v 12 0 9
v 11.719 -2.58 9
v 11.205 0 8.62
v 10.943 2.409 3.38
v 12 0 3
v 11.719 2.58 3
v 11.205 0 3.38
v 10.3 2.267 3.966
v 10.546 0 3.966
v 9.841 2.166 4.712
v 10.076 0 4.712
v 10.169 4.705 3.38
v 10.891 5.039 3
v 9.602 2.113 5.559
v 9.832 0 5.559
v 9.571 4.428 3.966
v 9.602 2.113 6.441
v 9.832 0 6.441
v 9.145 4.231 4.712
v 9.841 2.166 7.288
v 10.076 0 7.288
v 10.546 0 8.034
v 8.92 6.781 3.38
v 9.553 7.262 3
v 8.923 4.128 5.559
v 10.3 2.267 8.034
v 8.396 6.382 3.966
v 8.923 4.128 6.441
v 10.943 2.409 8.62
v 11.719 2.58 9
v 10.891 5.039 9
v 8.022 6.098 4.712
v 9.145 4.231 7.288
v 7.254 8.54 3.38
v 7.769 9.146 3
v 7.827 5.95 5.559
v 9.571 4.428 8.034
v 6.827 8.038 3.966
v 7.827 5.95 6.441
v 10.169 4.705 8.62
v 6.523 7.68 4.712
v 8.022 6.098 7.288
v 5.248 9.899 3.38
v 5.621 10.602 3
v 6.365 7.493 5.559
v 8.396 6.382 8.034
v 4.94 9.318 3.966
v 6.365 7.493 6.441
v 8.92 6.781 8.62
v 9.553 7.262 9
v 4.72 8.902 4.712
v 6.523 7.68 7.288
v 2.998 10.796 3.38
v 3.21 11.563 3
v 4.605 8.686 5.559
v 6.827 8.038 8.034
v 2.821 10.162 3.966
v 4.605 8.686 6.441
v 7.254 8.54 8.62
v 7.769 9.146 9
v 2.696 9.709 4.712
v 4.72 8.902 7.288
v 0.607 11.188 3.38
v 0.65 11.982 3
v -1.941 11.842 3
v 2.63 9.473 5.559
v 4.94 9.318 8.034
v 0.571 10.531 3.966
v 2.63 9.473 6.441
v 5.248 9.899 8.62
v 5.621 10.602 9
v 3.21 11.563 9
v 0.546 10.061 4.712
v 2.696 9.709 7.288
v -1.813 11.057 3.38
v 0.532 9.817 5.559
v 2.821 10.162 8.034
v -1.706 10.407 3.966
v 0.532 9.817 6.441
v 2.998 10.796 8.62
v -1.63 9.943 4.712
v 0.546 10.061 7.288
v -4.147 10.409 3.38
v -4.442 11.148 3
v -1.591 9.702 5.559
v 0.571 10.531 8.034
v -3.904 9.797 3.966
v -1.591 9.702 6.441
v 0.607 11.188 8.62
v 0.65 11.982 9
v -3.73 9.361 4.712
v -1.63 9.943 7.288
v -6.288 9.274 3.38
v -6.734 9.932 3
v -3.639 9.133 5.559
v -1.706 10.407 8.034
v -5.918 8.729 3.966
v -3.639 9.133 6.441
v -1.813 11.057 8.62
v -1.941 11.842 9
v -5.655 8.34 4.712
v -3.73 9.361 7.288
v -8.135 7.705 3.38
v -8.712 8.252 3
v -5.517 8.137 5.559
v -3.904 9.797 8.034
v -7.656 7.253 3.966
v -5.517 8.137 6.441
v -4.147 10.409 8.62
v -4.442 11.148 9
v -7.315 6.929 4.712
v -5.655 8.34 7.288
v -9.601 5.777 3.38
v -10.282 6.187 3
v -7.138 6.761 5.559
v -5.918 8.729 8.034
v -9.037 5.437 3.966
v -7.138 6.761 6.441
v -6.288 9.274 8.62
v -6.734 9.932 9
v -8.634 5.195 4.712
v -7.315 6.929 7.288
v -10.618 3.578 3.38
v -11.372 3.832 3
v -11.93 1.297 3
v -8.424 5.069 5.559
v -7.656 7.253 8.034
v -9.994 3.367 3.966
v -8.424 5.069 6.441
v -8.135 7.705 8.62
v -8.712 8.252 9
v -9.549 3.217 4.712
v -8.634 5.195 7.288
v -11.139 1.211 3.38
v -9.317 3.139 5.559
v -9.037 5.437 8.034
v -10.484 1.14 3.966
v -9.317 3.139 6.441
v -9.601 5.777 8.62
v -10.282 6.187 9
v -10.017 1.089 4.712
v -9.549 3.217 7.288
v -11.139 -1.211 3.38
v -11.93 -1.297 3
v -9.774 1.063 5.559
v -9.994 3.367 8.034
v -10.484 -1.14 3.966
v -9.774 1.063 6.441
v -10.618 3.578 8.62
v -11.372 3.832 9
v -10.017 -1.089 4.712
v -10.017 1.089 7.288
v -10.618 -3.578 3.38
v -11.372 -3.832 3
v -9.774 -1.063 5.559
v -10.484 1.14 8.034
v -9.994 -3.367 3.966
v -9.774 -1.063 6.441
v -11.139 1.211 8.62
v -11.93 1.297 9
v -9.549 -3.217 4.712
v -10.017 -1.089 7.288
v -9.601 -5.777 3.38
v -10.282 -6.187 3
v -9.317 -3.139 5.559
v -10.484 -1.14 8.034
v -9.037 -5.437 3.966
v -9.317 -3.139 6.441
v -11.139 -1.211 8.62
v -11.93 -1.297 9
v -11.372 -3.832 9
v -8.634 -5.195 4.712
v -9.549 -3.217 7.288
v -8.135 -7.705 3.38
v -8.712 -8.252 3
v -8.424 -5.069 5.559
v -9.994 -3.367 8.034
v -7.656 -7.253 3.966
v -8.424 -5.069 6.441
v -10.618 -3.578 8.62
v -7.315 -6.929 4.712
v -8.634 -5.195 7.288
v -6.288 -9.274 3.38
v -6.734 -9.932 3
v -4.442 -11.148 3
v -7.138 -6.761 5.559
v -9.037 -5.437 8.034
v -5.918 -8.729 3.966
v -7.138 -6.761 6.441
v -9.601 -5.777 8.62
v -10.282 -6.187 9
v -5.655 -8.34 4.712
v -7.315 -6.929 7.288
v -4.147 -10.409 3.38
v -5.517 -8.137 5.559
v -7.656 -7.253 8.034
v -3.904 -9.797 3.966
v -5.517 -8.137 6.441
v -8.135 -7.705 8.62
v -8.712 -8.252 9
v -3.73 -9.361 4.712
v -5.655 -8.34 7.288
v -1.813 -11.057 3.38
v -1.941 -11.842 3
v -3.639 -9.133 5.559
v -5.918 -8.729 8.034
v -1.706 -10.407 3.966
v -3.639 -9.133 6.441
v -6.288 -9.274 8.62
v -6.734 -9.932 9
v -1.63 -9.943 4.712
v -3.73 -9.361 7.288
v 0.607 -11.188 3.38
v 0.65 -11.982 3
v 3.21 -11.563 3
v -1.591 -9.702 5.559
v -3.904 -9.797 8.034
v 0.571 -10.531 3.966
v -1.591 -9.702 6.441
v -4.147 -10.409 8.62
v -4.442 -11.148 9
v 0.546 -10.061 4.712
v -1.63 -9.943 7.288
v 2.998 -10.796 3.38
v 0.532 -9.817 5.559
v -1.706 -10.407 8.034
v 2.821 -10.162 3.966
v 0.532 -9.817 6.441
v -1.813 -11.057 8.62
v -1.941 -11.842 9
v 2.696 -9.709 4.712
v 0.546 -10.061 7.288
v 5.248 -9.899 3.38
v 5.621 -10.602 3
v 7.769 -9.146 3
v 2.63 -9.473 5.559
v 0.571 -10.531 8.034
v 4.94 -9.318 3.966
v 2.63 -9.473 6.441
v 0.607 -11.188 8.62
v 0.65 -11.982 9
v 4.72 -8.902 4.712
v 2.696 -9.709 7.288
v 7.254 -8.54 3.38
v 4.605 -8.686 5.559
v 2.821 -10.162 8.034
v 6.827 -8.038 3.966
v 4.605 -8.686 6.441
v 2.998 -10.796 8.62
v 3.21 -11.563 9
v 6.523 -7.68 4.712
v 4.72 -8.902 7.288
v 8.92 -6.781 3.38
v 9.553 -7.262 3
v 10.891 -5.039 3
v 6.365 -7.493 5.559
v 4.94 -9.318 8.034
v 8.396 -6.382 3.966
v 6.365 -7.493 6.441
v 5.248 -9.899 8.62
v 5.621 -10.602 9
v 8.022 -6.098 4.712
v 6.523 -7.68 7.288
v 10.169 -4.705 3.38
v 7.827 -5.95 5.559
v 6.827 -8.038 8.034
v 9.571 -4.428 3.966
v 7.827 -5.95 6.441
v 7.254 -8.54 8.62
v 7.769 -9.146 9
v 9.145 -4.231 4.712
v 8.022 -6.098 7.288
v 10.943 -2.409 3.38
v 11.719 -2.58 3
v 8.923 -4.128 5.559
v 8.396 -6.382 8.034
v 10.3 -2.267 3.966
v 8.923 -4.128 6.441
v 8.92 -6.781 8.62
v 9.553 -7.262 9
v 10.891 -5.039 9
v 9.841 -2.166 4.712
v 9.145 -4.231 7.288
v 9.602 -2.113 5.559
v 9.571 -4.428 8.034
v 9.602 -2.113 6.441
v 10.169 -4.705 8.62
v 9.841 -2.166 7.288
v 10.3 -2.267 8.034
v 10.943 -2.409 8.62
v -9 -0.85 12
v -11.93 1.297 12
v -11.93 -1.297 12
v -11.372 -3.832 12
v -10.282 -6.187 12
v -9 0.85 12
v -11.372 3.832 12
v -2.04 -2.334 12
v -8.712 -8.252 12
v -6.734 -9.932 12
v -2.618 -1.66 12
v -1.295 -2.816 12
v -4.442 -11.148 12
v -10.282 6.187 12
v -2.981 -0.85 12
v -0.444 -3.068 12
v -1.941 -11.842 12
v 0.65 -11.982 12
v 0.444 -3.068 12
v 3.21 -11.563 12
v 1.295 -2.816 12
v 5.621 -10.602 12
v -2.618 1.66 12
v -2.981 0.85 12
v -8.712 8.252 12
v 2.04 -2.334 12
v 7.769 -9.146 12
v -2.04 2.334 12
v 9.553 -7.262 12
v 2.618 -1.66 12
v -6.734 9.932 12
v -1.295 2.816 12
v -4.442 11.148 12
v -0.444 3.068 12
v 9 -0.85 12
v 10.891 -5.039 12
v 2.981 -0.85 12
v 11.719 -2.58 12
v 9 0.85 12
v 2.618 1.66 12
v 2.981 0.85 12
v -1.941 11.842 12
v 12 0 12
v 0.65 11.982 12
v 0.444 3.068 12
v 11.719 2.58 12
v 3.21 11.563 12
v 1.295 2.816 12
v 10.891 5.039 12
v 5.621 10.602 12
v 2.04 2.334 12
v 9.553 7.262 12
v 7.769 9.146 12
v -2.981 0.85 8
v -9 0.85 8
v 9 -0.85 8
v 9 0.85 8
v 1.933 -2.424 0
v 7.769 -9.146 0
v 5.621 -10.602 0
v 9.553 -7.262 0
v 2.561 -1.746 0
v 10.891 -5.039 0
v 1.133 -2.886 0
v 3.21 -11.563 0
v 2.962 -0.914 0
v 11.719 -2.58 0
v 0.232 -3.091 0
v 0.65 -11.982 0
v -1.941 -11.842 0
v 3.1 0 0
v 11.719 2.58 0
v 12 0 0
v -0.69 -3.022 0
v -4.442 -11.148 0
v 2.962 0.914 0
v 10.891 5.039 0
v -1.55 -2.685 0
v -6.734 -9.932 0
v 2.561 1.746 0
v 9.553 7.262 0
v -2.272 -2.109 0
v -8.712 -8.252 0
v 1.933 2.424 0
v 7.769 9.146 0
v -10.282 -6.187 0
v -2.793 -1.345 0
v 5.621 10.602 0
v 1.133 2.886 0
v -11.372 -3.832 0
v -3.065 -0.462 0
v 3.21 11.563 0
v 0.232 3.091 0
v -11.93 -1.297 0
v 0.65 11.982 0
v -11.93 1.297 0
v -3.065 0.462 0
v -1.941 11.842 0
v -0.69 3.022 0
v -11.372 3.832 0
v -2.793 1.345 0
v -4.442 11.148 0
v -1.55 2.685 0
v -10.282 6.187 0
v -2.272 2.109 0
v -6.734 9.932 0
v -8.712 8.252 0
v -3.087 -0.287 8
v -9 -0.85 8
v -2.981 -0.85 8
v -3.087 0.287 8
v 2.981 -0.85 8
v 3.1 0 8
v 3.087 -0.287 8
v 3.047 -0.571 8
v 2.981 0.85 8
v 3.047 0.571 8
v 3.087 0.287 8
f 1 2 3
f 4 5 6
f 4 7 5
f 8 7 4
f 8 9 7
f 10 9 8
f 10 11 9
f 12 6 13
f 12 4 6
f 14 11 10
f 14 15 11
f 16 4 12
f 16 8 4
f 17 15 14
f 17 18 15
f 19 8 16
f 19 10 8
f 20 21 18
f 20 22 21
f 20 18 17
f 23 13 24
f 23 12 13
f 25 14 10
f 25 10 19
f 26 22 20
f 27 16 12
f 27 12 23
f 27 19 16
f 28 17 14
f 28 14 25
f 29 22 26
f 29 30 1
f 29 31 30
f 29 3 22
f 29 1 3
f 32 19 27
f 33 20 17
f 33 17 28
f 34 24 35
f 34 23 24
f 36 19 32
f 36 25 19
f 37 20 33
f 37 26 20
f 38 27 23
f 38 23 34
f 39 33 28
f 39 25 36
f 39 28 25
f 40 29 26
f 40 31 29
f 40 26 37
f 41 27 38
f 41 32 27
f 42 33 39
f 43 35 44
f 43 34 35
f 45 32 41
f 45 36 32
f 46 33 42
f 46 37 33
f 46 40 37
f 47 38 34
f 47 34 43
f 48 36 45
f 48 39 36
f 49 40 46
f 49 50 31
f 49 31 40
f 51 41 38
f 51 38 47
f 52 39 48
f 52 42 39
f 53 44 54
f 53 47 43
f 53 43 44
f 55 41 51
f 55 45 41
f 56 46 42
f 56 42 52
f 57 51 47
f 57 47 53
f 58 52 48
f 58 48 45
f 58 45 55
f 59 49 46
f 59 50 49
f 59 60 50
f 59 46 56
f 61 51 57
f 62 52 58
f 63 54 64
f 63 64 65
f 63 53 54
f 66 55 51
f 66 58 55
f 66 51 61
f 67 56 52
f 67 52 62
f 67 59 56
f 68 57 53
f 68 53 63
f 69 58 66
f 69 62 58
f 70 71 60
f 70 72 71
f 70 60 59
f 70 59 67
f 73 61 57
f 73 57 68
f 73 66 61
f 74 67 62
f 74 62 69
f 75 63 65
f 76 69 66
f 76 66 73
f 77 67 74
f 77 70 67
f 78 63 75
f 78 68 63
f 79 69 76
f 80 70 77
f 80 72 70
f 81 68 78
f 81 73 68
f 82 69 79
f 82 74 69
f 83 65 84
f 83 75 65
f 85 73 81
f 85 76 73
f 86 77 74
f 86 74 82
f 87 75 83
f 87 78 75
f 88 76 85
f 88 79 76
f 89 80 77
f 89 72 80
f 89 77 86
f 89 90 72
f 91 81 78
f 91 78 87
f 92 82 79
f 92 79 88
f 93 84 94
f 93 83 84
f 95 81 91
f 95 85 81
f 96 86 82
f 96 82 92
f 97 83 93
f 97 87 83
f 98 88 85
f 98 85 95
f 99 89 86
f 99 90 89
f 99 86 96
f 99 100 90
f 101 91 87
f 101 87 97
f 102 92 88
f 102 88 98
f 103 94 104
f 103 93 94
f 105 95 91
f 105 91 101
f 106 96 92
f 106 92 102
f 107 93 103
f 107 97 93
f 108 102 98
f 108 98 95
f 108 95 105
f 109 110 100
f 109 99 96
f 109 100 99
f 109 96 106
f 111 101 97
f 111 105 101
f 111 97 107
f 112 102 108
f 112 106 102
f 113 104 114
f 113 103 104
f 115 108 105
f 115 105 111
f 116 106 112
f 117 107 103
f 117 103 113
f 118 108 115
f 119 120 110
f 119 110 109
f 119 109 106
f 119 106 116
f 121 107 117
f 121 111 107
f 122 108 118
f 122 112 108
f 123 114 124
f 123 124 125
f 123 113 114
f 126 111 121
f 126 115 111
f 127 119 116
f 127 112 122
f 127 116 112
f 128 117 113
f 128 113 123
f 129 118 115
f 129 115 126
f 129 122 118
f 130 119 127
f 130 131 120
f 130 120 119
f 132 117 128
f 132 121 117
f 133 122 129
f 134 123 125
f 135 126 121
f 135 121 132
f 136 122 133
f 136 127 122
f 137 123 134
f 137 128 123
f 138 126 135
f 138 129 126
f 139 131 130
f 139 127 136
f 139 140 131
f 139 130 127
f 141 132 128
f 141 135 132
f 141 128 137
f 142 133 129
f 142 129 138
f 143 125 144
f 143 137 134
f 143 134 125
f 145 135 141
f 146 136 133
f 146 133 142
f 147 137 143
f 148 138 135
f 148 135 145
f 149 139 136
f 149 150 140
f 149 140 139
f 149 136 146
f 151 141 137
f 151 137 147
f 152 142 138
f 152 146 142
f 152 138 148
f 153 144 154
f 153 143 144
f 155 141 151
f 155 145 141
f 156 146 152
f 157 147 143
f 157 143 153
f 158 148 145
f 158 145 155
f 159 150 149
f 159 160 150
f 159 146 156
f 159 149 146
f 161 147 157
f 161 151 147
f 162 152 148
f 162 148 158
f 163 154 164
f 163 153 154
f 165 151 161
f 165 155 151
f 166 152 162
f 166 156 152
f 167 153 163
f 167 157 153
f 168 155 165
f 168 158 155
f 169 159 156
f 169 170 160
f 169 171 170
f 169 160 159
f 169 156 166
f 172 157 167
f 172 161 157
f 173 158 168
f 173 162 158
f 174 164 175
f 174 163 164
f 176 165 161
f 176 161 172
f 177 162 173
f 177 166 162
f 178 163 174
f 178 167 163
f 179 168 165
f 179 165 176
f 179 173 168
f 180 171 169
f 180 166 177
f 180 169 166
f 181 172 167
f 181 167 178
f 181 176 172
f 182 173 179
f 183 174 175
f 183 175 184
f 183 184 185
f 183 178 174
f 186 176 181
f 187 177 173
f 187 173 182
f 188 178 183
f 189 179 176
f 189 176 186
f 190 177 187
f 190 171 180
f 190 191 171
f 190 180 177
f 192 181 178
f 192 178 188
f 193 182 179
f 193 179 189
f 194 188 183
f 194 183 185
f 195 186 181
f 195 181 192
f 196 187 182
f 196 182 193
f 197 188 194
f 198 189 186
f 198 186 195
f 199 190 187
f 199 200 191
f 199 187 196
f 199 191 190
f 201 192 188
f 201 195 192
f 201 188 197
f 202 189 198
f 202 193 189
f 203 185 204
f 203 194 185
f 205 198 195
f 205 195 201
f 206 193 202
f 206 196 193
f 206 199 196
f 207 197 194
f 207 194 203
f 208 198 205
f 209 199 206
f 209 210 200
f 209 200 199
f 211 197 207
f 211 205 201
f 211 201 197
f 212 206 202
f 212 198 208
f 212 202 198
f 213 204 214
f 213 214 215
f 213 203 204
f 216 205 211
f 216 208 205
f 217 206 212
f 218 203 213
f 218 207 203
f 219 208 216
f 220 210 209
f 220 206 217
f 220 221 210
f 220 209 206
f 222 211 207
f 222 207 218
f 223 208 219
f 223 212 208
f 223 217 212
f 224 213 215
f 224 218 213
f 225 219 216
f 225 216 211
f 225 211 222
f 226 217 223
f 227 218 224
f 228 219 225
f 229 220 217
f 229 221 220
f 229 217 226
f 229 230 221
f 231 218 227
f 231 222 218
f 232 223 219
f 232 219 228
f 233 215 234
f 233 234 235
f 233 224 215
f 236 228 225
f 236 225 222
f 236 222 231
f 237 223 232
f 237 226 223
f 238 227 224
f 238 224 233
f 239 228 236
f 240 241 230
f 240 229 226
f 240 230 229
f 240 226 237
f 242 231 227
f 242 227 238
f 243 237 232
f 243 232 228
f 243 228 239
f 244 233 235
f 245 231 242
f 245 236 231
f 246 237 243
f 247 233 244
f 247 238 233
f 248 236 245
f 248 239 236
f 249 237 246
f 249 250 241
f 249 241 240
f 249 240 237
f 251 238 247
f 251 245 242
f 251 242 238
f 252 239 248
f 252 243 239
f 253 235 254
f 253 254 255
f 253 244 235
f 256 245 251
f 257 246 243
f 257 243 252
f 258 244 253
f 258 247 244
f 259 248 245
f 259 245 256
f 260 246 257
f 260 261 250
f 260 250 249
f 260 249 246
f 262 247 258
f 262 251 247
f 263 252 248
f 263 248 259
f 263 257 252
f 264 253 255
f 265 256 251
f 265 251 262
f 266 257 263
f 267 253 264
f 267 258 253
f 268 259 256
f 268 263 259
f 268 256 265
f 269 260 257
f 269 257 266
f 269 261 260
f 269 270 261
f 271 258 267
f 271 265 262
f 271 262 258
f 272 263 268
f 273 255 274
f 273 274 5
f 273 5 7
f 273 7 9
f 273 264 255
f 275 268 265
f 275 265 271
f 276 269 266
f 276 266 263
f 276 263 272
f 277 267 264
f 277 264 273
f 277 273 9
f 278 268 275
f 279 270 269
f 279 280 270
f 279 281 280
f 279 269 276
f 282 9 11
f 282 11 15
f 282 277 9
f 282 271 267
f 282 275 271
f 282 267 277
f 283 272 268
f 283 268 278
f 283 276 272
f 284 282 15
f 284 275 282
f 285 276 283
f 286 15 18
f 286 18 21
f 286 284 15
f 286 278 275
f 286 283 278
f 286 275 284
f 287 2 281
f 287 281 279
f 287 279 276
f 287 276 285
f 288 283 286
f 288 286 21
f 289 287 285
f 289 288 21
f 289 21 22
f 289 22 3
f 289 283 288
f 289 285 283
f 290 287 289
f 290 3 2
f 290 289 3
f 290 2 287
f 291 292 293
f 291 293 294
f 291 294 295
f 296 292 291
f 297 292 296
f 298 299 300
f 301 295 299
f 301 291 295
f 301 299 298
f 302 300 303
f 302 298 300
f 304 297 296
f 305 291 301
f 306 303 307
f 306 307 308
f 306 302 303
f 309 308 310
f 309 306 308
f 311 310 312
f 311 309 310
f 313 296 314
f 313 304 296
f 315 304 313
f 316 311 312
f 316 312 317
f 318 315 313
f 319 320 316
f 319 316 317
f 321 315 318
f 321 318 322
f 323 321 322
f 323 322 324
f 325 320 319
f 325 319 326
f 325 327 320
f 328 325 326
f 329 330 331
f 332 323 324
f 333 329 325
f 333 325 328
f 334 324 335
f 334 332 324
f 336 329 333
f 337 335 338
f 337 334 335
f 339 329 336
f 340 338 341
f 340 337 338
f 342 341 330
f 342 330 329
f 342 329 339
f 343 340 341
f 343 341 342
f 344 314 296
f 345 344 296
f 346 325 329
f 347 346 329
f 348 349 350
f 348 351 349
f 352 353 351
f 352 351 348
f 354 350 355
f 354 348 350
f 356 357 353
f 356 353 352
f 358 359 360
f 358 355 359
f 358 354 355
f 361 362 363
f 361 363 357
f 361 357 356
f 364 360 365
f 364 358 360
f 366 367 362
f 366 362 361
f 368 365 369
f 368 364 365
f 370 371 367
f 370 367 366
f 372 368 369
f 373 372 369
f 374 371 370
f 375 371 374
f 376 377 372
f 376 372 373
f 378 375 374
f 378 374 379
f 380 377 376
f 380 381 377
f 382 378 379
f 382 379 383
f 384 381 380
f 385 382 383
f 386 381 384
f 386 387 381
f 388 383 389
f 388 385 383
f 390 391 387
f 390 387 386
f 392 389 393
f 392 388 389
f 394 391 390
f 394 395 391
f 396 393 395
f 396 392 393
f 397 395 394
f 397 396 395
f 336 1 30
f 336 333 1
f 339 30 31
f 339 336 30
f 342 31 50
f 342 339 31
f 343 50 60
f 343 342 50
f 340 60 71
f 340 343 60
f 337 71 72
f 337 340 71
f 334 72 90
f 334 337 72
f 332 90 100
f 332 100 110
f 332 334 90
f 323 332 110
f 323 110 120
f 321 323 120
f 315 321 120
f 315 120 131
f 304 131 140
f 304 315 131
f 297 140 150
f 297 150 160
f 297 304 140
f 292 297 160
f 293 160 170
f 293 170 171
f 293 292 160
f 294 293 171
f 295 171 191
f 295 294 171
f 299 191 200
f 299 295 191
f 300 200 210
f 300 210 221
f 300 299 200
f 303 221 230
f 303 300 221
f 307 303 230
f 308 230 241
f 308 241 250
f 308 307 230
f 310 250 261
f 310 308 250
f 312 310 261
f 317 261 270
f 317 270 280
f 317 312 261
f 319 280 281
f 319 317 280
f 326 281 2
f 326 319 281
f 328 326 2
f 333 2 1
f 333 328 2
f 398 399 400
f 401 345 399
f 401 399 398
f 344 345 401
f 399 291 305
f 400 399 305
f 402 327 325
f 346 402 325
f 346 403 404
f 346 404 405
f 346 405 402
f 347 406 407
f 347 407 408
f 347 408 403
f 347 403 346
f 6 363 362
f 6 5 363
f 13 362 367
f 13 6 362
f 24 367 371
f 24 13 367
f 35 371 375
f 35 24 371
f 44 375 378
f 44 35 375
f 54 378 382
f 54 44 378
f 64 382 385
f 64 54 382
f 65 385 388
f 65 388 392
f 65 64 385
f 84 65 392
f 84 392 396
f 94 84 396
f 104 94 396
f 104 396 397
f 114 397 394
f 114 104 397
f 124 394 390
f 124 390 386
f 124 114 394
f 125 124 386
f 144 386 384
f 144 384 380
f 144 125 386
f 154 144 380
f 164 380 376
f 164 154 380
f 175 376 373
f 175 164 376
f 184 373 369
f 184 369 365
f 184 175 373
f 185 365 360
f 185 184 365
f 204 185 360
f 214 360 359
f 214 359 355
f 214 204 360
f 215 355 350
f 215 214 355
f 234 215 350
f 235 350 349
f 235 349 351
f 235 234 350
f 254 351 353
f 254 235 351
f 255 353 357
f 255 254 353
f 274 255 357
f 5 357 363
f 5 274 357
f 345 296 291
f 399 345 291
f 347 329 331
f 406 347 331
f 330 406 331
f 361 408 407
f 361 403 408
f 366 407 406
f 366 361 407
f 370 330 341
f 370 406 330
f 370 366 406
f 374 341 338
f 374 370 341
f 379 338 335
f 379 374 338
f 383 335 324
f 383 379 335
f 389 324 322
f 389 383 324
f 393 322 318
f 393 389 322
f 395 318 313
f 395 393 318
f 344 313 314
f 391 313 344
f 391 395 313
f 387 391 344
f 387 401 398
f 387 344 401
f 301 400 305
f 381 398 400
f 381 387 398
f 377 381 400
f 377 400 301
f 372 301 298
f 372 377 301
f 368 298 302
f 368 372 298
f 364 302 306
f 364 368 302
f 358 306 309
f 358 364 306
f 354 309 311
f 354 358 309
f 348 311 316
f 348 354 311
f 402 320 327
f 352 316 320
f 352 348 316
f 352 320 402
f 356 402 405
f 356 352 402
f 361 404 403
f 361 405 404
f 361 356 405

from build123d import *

# Parameters (mm, degrees)
F3_DEPTH = 4


with BuildPart() as f1:
    # F0 (on Front) → F1 (revolve)
    with BuildSketch(Plane.XZ):
        with BuildLine():
            Line((12, 9), (12, 12))
            Line((12, 12), (3.1, 12))
            Line((3.1, 12), (3.1, 0))
            Line((3.1, 0), (12, 0))
            Line((12, 0), (12, 3))
            ThreePointArc((12, 3), (9.800525, 6), (12, 9))
        make_face()
    revolve(axis=Axis((0, 0, 8.473897), (0, 0, 1)))

    # F2 (on face) → F3 (cut)
    with BuildSketch(Plane.XY.offset(12)):
        with BuildLine():
            Line((-9, -0.85), (-2.981191, -0.85))
            ThreePointArc((-2.981191, -0.85), (-3.1, 0), (-2.981191, 0.85))
            Line((-2.981191, 0.85), (-9, 0.85))
            Line((-9, 0.85), (-9, -0.85))
        make_face()
        with BuildLine():
            Line((2.981191, -0.85), (9, -0.85))
            Line((9, -0.85), (9, 0.85))
            Line((9, 0.85), (2.981191, 0.85))
            ThreePointArc((2.981191, 0.85), (3.070154, 0.429132), (3.1, 0))
            ThreePointArc((3.1, 0), (3.070154, -0.429132), (2.981191, -0.85))
        make_face()
    extrude(amount=-F3_DEPTH, mode=Mode.SUBTRACT)


solid = f1.part
